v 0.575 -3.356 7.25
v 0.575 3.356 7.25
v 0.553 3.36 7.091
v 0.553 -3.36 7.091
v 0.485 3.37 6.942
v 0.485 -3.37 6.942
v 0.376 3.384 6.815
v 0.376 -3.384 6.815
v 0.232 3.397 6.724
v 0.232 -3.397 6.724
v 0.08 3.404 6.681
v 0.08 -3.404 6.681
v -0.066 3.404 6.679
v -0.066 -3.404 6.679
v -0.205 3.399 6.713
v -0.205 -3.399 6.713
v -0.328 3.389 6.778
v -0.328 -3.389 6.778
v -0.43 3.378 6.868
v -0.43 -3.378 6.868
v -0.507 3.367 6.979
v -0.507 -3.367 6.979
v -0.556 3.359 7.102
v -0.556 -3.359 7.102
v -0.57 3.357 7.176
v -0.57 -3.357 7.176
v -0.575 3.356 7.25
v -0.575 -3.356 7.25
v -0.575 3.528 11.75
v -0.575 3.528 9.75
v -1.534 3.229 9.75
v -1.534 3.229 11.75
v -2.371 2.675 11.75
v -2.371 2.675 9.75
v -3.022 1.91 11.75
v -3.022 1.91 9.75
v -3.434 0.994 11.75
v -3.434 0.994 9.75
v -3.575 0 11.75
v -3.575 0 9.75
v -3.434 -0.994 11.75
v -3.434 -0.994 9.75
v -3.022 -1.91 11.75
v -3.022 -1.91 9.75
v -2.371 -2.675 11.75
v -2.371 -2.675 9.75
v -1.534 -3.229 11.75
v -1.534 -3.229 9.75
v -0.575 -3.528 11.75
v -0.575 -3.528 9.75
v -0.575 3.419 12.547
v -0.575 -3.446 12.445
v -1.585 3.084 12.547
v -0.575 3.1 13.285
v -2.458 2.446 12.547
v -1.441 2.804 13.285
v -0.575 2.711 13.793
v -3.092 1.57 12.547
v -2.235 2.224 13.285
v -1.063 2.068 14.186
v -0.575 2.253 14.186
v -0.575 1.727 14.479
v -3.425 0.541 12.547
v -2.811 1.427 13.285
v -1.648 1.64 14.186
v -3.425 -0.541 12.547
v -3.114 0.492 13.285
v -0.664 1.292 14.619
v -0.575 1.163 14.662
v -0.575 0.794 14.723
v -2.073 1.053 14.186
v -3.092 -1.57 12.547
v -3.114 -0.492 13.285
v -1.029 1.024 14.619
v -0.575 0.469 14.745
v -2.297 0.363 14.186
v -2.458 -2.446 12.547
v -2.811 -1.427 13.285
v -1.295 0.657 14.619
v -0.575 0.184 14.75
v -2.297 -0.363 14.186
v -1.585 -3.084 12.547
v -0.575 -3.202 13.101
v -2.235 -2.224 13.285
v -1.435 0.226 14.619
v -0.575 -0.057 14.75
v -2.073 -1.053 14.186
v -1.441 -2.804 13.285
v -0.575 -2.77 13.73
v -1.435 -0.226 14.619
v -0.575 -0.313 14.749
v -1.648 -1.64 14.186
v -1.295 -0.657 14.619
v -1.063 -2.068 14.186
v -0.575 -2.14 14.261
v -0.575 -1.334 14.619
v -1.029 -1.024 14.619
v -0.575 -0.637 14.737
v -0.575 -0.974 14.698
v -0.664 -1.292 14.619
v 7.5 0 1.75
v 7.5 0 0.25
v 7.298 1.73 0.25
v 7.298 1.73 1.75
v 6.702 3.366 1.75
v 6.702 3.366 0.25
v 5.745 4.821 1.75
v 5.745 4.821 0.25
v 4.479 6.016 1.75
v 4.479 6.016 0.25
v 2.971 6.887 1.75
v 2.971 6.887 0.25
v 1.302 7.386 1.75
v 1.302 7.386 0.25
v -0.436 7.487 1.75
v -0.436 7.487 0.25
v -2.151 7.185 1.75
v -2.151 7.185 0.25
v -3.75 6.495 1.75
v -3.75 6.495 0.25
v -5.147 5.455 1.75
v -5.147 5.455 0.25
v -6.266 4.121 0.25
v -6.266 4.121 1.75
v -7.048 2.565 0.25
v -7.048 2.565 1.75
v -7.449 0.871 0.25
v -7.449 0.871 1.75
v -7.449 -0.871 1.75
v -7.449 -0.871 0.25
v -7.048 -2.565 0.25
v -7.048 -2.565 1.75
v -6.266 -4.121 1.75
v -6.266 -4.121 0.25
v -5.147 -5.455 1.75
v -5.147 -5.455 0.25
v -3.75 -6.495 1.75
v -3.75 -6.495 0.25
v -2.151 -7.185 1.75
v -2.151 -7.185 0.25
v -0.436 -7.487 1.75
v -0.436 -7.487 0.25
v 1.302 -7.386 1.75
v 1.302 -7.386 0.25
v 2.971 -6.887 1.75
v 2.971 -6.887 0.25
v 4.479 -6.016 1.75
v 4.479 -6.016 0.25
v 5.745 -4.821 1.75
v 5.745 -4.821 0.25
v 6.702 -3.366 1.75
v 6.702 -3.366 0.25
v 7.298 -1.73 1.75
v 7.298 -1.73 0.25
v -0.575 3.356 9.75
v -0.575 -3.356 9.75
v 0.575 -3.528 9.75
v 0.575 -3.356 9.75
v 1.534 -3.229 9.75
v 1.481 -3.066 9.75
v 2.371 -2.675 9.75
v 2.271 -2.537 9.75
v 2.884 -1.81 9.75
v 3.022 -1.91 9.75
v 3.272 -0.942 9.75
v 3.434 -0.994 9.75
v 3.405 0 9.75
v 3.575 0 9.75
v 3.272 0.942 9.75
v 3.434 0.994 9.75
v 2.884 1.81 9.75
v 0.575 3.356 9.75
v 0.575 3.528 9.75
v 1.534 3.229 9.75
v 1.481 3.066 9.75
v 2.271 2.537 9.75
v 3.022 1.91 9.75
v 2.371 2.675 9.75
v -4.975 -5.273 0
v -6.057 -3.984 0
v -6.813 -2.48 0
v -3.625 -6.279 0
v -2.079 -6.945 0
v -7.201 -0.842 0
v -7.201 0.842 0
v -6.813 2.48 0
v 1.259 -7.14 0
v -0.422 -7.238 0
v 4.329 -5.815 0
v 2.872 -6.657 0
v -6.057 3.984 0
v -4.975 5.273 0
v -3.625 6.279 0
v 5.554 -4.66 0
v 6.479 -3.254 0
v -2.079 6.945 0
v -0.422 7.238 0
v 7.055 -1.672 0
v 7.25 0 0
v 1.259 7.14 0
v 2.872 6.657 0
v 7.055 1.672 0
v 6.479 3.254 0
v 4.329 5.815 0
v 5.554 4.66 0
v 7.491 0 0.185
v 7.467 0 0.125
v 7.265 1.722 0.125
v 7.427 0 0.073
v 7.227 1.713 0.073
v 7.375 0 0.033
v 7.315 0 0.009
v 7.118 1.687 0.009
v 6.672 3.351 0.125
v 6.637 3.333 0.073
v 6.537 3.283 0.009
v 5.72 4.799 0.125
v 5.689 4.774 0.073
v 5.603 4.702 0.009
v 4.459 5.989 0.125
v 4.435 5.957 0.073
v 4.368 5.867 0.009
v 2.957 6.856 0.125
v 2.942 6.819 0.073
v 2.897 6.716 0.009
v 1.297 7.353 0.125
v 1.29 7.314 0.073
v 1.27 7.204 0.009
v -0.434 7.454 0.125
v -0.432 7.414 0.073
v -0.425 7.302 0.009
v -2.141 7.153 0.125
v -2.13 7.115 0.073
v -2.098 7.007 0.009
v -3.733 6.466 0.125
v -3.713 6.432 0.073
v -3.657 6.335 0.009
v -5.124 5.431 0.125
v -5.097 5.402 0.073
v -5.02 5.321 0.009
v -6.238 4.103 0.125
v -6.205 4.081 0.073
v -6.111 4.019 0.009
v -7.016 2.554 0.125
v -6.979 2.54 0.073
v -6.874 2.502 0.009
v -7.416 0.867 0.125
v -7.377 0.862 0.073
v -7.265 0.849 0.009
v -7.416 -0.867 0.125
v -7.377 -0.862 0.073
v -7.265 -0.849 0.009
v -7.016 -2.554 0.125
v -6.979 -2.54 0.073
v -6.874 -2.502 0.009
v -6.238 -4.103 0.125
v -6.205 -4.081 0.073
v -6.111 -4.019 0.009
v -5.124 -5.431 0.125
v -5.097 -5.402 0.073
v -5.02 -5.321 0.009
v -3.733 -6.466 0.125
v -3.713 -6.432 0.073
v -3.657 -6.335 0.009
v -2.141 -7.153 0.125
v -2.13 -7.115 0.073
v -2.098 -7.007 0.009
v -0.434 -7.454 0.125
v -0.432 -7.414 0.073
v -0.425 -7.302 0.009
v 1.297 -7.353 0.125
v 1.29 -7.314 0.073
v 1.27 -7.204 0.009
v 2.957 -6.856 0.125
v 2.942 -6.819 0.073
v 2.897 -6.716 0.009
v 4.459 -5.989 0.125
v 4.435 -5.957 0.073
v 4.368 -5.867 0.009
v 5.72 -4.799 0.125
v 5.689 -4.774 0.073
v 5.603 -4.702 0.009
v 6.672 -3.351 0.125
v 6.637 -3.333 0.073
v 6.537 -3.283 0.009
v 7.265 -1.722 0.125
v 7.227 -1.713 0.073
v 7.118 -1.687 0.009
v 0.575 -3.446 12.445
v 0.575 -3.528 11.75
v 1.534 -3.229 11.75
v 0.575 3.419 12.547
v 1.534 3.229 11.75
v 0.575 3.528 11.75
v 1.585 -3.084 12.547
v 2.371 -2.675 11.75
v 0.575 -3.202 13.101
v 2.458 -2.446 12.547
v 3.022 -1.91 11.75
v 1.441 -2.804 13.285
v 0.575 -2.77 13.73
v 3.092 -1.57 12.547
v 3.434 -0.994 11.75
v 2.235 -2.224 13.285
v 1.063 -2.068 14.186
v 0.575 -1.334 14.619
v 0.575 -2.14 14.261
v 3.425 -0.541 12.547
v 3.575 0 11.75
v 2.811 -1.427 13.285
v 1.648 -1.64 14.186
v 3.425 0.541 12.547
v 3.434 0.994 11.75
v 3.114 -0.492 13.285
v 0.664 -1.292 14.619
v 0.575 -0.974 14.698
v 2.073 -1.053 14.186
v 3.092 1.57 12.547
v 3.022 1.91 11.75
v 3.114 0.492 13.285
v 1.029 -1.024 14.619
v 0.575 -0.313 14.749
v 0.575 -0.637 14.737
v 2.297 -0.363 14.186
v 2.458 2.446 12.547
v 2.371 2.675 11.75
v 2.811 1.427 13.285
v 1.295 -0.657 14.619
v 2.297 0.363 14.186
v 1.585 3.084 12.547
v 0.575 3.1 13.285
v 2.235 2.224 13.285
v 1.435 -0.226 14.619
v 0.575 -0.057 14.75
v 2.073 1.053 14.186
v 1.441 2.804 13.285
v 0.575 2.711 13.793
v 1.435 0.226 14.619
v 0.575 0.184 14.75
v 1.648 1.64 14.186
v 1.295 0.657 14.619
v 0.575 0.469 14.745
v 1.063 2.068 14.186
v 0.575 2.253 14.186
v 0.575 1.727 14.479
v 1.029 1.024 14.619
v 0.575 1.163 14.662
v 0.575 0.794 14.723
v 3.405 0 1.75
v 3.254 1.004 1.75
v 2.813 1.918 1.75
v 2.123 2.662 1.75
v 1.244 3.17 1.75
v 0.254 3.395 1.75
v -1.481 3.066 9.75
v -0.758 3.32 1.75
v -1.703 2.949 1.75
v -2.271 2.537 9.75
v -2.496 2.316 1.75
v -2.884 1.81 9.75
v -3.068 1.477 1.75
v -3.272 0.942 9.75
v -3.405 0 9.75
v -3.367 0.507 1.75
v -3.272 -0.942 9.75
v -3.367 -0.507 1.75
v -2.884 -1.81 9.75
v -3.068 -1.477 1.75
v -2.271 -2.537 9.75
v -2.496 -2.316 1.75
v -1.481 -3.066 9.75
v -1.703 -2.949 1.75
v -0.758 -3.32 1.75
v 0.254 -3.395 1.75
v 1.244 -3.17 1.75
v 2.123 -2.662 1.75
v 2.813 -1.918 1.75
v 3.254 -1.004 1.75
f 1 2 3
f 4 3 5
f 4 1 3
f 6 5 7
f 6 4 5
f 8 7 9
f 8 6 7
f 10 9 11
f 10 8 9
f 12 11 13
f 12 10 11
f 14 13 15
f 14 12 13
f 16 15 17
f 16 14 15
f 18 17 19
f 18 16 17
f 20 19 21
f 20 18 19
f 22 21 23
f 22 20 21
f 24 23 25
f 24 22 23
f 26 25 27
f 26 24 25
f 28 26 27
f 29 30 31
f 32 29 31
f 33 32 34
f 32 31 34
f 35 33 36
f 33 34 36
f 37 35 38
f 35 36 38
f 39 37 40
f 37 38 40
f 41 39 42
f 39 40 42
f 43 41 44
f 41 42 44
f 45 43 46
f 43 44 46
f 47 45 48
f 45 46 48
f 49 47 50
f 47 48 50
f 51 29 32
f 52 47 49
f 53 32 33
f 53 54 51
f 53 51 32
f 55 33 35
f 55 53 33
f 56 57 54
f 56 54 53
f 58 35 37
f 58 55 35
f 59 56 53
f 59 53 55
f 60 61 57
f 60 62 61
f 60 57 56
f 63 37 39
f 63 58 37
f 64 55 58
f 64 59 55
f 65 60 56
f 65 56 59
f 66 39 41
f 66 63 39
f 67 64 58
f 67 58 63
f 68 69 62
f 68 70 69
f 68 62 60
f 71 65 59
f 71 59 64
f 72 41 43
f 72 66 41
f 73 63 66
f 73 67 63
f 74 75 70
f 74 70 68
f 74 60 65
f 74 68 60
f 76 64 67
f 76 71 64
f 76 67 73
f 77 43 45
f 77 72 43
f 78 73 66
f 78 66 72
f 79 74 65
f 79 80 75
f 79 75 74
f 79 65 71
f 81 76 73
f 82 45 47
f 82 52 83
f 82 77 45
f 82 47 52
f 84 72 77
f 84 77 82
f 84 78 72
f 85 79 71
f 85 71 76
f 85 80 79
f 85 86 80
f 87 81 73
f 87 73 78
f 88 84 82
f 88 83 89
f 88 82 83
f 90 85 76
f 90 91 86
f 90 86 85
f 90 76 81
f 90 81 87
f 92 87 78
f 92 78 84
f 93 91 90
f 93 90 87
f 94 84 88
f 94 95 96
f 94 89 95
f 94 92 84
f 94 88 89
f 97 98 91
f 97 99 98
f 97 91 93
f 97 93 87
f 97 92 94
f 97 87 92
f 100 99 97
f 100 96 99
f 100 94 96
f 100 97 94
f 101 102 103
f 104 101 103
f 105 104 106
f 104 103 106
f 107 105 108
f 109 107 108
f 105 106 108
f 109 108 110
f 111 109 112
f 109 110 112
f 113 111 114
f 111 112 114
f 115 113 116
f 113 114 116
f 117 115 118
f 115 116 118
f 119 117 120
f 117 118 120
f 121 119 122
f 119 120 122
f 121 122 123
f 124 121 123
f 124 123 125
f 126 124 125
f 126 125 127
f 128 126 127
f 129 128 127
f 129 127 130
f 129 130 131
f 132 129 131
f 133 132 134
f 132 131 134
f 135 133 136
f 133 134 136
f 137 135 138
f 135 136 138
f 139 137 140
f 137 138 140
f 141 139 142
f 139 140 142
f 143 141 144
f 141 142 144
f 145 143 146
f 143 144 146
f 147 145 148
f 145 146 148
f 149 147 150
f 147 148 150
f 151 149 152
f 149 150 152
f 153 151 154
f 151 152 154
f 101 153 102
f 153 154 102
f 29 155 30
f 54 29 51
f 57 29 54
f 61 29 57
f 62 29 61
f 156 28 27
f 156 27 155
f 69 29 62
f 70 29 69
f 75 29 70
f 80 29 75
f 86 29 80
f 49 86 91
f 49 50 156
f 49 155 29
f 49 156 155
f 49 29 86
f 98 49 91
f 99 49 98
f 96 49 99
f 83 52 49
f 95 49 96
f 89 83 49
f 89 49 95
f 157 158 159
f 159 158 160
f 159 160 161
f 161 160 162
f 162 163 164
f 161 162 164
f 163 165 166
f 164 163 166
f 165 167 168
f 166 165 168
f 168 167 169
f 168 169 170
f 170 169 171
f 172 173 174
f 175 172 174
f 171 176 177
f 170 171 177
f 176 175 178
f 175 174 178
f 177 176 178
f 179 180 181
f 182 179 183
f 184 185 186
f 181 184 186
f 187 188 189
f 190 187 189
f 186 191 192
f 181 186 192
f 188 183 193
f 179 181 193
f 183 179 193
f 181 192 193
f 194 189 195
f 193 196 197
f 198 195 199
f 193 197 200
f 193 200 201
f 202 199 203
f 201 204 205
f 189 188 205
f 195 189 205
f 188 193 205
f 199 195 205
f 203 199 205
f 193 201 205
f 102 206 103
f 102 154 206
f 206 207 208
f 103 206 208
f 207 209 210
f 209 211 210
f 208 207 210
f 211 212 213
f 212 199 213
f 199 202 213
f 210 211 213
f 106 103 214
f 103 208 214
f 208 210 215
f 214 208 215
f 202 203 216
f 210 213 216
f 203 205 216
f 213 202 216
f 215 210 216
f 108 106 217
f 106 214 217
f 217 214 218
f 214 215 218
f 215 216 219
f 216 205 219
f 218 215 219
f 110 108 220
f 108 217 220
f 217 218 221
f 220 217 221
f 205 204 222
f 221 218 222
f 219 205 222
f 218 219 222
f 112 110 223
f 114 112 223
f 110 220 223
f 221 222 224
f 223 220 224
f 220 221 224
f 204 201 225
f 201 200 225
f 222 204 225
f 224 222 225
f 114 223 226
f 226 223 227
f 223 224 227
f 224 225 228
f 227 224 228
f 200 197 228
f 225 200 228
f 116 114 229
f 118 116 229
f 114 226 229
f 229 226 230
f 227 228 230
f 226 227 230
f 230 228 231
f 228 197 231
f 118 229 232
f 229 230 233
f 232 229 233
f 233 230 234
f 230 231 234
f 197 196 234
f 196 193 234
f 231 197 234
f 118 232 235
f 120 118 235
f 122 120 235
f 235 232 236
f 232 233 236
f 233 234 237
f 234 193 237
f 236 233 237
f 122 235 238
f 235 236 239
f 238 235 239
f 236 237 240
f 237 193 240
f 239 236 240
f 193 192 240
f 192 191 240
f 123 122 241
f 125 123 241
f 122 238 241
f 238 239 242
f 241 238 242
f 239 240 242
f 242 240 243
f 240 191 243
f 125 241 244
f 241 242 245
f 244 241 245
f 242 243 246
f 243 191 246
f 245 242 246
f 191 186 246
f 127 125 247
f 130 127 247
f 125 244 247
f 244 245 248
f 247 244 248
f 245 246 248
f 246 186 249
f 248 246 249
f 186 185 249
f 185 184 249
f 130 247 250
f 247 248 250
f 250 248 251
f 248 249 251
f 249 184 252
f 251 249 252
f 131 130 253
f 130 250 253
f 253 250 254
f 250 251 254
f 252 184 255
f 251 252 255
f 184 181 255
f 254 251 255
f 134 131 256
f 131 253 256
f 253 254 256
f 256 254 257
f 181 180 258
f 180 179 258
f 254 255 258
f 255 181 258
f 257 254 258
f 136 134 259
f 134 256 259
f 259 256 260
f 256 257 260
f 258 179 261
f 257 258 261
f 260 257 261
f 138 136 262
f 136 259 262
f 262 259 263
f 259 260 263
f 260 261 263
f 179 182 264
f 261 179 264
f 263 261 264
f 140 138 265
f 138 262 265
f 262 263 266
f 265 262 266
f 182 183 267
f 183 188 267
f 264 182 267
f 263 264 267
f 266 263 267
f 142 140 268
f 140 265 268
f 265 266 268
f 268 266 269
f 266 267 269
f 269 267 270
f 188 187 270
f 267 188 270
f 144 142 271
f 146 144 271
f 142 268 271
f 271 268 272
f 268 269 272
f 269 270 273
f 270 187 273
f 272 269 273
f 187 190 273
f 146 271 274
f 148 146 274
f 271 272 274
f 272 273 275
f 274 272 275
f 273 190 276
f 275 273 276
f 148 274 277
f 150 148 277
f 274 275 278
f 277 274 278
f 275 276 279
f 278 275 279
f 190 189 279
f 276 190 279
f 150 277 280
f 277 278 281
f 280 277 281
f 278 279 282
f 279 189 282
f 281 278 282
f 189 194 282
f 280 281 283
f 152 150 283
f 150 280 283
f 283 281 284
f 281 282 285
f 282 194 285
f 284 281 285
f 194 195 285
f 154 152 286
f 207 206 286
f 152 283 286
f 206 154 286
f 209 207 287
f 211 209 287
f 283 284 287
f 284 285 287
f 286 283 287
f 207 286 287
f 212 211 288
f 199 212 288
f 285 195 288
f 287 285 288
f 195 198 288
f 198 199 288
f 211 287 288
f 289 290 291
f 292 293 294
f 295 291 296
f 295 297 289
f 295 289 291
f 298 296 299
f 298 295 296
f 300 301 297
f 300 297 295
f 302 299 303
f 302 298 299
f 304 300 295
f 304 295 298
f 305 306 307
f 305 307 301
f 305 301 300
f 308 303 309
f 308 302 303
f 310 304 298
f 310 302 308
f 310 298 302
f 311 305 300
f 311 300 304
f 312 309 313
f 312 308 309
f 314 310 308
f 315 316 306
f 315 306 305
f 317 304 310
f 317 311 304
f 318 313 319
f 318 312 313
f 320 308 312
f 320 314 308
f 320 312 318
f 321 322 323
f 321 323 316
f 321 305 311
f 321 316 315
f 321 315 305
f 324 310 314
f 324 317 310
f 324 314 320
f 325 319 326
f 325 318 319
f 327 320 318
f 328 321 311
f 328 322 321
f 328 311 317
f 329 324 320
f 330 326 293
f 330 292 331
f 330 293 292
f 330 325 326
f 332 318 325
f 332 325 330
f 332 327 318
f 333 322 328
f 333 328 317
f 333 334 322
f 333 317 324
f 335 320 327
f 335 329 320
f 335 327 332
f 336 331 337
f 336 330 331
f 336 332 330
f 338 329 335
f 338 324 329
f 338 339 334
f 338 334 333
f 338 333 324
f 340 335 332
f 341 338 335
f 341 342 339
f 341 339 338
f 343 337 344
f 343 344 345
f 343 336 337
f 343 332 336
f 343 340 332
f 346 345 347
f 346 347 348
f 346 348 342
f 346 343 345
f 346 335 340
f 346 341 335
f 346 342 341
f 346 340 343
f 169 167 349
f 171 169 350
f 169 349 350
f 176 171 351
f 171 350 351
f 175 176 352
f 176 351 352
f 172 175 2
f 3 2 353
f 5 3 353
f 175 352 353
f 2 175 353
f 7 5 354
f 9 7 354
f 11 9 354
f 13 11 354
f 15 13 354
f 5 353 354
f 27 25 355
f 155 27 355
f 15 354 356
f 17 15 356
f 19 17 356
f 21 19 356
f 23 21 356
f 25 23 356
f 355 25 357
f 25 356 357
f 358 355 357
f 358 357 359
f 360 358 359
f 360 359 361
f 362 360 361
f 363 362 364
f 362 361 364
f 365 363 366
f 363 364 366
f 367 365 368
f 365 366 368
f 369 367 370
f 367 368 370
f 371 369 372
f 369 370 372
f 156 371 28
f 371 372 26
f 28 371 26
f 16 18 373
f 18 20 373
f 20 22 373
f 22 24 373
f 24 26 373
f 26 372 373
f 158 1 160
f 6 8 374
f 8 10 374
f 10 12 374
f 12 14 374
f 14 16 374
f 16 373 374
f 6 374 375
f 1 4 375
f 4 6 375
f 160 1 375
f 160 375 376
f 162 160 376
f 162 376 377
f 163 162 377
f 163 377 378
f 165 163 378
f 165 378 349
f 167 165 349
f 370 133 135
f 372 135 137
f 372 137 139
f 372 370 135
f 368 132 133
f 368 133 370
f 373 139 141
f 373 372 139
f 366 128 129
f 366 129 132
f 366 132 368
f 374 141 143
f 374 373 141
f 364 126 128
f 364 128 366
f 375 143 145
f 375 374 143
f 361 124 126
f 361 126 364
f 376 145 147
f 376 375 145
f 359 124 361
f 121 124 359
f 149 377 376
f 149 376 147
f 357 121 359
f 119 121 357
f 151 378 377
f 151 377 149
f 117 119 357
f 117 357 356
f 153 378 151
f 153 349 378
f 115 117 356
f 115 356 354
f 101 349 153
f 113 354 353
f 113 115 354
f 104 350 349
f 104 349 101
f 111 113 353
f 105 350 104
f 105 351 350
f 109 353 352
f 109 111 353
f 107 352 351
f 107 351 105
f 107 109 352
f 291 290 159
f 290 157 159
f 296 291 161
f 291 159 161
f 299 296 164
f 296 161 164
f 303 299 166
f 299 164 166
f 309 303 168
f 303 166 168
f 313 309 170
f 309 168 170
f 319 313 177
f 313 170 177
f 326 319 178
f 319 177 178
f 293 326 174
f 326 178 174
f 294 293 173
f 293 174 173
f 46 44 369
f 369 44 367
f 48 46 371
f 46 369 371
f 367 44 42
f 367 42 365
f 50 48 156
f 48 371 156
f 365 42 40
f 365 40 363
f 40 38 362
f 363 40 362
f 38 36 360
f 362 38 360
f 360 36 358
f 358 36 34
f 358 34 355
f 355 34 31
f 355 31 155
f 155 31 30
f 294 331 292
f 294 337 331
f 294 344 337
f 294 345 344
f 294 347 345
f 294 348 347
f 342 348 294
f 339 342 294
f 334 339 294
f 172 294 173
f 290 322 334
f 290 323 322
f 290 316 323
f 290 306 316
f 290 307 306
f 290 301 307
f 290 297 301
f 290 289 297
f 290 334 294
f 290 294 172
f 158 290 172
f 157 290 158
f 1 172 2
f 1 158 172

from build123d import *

# Parameters (mm, degrees)
SKETCH2_R               = 7.5
BOSS_EXTRUDE1_DEPTH     = 1.75
FILLET1_R               = 0.25
SKETCH3_R               = 3.405
BOSS_EXTRUDE2_DEPTH     = 8
SKETCH4_R               = 3.575
BOSS_EXTRUDE3_DEPTH     = 5
FILLET3_R               = 3
CUT_EXTRUDE1_DEPTH      = 19.167622299
CUT_EXTRUDE1_DEPTH_BACK = 19.167622299


with BuildPart() as part:
    # Sketch2 → Boss-Extrude1 (new body)
    with BuildSketch(Plane.XY):
        Circle(SKETCH2_R)
    extrude(amount=BOSS_EXTRUDE1_DEPTH)

    # Fillet1
    fillet1_edges = [part.edges().sort_by_distance(p)[0] for p in [
        (-7.5, 0, 0),
    ]]
    fillet(fillet1_edges, radius=FILLET1_R)

    # Sketch3 → Boss-Extrude2 (add)
    with BuildSketch(Plane.XY.offset(1.75)):
        Circle(SKETCH3_R)
    extrude(amount=BOSS_EXTRUDE2_DEPTH)

    # Sketch4 → Boss-Extrude3 (add)
    with BuildSketch(Plane.XY.offset(9.75)):
        Circle(SKETCH4_R)
    extrude(amount=BOSS_EXTRUDE3_DEPTH)

    # Fillet3
    fillet3_edges = [part.edges().sort_by_distance(p)[0] for p in [
        (-3.575, 0, 14.75),
    ]]
    fillet(fillet3_edges, radius=FILLET3_R)

    # Sketch5 → Cut-Extrude1 (cut, two sides: drawn at the far end of the back side and taken through both)
    with BuildSketch(Plane(origin=(0, 0, 0), x_dir=(1, 0, 0), z_dir=(0, 1, 0)).offset(-CUT_EXTRUDE1_DEPTH_BACK)):
        with BuildLine():
            Line((0.575, -14.75), (0.575, -7.25))
            ThreePointArc((0.575, -7.25), (0, -6.675), (-0.575, -7.25))
            Line((-0.575, -7.25), (-0.575, -14.75))
            Line((-0.575, -14.75), (0.575, -14.75))
        make_face()
    extrude(amount=CUT_EXTRUDE1_DEPTH + CUT_EXTRUDE1_DEPTH_BACK, mode=Mode.SUBTRACT)


solid = part.part
